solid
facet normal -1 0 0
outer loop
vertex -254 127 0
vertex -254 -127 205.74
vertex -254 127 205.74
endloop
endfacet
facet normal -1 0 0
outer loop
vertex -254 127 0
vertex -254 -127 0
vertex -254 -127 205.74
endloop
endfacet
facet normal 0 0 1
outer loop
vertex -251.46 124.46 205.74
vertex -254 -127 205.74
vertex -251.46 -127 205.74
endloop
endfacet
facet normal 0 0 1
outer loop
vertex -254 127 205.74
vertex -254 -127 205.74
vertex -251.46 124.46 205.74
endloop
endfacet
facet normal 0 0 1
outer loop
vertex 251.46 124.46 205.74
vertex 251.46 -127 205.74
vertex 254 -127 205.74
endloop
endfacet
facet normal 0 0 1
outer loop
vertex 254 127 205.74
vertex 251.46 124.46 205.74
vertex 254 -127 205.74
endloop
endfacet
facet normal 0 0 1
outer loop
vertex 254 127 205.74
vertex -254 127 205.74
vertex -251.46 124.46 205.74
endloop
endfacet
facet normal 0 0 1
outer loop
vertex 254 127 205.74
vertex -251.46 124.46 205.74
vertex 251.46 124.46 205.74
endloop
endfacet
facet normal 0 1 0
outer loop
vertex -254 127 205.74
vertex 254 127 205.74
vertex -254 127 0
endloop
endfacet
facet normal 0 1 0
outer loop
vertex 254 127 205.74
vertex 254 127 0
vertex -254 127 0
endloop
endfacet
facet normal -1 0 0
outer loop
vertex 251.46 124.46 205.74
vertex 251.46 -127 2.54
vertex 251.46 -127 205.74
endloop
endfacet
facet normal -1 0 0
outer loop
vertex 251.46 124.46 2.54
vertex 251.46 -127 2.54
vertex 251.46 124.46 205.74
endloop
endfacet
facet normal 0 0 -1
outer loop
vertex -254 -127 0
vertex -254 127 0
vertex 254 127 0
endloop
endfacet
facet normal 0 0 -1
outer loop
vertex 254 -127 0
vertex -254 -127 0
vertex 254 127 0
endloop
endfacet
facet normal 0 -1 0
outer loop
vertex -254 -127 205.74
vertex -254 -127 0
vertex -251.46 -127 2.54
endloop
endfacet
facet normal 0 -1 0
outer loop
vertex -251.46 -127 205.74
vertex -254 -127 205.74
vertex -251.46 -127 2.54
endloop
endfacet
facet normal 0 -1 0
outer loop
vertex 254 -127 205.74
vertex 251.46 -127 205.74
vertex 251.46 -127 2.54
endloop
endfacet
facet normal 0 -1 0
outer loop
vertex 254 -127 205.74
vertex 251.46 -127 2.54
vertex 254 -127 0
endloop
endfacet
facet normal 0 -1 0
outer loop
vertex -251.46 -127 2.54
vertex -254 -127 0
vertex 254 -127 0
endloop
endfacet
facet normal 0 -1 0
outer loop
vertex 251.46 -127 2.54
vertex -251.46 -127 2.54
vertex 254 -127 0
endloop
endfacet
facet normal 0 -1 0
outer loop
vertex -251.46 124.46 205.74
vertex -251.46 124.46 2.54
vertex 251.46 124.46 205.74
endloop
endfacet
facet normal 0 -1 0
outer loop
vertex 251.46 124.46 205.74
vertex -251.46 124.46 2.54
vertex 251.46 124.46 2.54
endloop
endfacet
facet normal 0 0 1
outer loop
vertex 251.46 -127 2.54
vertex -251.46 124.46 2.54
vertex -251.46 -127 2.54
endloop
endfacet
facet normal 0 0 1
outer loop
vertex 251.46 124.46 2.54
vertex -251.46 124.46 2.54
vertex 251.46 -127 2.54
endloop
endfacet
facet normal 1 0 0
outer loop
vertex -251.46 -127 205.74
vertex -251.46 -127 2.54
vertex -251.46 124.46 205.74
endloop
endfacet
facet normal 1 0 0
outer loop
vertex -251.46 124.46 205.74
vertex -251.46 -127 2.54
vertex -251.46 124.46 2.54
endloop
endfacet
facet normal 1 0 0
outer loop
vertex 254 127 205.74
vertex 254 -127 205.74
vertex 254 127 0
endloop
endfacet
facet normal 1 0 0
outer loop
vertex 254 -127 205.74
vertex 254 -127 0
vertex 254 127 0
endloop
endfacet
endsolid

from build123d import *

# Parameters (mm, degrees)
F0_W     = 508
F0_H     = 254
F1_DEPTH = 2.54
F2_W     = 2.54
F2_H     = 254
F3_DEPTH = 203.2
F5_DEPTH = 203.2
F6_W     = 2.54
F6_H     = 251.46
F7_DEPTH = 203.2


with BuildPart() as f1:
    # F0 (on Top) → F1 (new body)
    with BuildSketch(Plane.XY):
        Rectangle(F0_W, F0_H)
    extrude(amount=F1_DEPTH)

    # F2 (on face) → F3 (join)
    with BuildSketch(Plane.XY.offset(2.54)):
        with Locations((-252.73, 0)):
            Rectangle(F2_W, F2_H)
    extrude(amount=F3_DEPTH)

    # F4 (on face) → F5 (join)
    with BuildSketch(Plane.XY.offset(2.54)):
        Polygon((254, 124.46), (254, 127), (-49.611485, 127), (-251.46, 127), (-251.46, 124.46), align=None)
    extrude(amount=F5_DEPTH)

    # F6 (on face) → F7 (join)
    with BuildSketch(Plane.XY.offset(2.54)):
        with Locations((252.73, -1.27)):
            Rectangle(F6_W, F6_H)
    extrude(amount=F7_DEPTH)


solid = f1.part
